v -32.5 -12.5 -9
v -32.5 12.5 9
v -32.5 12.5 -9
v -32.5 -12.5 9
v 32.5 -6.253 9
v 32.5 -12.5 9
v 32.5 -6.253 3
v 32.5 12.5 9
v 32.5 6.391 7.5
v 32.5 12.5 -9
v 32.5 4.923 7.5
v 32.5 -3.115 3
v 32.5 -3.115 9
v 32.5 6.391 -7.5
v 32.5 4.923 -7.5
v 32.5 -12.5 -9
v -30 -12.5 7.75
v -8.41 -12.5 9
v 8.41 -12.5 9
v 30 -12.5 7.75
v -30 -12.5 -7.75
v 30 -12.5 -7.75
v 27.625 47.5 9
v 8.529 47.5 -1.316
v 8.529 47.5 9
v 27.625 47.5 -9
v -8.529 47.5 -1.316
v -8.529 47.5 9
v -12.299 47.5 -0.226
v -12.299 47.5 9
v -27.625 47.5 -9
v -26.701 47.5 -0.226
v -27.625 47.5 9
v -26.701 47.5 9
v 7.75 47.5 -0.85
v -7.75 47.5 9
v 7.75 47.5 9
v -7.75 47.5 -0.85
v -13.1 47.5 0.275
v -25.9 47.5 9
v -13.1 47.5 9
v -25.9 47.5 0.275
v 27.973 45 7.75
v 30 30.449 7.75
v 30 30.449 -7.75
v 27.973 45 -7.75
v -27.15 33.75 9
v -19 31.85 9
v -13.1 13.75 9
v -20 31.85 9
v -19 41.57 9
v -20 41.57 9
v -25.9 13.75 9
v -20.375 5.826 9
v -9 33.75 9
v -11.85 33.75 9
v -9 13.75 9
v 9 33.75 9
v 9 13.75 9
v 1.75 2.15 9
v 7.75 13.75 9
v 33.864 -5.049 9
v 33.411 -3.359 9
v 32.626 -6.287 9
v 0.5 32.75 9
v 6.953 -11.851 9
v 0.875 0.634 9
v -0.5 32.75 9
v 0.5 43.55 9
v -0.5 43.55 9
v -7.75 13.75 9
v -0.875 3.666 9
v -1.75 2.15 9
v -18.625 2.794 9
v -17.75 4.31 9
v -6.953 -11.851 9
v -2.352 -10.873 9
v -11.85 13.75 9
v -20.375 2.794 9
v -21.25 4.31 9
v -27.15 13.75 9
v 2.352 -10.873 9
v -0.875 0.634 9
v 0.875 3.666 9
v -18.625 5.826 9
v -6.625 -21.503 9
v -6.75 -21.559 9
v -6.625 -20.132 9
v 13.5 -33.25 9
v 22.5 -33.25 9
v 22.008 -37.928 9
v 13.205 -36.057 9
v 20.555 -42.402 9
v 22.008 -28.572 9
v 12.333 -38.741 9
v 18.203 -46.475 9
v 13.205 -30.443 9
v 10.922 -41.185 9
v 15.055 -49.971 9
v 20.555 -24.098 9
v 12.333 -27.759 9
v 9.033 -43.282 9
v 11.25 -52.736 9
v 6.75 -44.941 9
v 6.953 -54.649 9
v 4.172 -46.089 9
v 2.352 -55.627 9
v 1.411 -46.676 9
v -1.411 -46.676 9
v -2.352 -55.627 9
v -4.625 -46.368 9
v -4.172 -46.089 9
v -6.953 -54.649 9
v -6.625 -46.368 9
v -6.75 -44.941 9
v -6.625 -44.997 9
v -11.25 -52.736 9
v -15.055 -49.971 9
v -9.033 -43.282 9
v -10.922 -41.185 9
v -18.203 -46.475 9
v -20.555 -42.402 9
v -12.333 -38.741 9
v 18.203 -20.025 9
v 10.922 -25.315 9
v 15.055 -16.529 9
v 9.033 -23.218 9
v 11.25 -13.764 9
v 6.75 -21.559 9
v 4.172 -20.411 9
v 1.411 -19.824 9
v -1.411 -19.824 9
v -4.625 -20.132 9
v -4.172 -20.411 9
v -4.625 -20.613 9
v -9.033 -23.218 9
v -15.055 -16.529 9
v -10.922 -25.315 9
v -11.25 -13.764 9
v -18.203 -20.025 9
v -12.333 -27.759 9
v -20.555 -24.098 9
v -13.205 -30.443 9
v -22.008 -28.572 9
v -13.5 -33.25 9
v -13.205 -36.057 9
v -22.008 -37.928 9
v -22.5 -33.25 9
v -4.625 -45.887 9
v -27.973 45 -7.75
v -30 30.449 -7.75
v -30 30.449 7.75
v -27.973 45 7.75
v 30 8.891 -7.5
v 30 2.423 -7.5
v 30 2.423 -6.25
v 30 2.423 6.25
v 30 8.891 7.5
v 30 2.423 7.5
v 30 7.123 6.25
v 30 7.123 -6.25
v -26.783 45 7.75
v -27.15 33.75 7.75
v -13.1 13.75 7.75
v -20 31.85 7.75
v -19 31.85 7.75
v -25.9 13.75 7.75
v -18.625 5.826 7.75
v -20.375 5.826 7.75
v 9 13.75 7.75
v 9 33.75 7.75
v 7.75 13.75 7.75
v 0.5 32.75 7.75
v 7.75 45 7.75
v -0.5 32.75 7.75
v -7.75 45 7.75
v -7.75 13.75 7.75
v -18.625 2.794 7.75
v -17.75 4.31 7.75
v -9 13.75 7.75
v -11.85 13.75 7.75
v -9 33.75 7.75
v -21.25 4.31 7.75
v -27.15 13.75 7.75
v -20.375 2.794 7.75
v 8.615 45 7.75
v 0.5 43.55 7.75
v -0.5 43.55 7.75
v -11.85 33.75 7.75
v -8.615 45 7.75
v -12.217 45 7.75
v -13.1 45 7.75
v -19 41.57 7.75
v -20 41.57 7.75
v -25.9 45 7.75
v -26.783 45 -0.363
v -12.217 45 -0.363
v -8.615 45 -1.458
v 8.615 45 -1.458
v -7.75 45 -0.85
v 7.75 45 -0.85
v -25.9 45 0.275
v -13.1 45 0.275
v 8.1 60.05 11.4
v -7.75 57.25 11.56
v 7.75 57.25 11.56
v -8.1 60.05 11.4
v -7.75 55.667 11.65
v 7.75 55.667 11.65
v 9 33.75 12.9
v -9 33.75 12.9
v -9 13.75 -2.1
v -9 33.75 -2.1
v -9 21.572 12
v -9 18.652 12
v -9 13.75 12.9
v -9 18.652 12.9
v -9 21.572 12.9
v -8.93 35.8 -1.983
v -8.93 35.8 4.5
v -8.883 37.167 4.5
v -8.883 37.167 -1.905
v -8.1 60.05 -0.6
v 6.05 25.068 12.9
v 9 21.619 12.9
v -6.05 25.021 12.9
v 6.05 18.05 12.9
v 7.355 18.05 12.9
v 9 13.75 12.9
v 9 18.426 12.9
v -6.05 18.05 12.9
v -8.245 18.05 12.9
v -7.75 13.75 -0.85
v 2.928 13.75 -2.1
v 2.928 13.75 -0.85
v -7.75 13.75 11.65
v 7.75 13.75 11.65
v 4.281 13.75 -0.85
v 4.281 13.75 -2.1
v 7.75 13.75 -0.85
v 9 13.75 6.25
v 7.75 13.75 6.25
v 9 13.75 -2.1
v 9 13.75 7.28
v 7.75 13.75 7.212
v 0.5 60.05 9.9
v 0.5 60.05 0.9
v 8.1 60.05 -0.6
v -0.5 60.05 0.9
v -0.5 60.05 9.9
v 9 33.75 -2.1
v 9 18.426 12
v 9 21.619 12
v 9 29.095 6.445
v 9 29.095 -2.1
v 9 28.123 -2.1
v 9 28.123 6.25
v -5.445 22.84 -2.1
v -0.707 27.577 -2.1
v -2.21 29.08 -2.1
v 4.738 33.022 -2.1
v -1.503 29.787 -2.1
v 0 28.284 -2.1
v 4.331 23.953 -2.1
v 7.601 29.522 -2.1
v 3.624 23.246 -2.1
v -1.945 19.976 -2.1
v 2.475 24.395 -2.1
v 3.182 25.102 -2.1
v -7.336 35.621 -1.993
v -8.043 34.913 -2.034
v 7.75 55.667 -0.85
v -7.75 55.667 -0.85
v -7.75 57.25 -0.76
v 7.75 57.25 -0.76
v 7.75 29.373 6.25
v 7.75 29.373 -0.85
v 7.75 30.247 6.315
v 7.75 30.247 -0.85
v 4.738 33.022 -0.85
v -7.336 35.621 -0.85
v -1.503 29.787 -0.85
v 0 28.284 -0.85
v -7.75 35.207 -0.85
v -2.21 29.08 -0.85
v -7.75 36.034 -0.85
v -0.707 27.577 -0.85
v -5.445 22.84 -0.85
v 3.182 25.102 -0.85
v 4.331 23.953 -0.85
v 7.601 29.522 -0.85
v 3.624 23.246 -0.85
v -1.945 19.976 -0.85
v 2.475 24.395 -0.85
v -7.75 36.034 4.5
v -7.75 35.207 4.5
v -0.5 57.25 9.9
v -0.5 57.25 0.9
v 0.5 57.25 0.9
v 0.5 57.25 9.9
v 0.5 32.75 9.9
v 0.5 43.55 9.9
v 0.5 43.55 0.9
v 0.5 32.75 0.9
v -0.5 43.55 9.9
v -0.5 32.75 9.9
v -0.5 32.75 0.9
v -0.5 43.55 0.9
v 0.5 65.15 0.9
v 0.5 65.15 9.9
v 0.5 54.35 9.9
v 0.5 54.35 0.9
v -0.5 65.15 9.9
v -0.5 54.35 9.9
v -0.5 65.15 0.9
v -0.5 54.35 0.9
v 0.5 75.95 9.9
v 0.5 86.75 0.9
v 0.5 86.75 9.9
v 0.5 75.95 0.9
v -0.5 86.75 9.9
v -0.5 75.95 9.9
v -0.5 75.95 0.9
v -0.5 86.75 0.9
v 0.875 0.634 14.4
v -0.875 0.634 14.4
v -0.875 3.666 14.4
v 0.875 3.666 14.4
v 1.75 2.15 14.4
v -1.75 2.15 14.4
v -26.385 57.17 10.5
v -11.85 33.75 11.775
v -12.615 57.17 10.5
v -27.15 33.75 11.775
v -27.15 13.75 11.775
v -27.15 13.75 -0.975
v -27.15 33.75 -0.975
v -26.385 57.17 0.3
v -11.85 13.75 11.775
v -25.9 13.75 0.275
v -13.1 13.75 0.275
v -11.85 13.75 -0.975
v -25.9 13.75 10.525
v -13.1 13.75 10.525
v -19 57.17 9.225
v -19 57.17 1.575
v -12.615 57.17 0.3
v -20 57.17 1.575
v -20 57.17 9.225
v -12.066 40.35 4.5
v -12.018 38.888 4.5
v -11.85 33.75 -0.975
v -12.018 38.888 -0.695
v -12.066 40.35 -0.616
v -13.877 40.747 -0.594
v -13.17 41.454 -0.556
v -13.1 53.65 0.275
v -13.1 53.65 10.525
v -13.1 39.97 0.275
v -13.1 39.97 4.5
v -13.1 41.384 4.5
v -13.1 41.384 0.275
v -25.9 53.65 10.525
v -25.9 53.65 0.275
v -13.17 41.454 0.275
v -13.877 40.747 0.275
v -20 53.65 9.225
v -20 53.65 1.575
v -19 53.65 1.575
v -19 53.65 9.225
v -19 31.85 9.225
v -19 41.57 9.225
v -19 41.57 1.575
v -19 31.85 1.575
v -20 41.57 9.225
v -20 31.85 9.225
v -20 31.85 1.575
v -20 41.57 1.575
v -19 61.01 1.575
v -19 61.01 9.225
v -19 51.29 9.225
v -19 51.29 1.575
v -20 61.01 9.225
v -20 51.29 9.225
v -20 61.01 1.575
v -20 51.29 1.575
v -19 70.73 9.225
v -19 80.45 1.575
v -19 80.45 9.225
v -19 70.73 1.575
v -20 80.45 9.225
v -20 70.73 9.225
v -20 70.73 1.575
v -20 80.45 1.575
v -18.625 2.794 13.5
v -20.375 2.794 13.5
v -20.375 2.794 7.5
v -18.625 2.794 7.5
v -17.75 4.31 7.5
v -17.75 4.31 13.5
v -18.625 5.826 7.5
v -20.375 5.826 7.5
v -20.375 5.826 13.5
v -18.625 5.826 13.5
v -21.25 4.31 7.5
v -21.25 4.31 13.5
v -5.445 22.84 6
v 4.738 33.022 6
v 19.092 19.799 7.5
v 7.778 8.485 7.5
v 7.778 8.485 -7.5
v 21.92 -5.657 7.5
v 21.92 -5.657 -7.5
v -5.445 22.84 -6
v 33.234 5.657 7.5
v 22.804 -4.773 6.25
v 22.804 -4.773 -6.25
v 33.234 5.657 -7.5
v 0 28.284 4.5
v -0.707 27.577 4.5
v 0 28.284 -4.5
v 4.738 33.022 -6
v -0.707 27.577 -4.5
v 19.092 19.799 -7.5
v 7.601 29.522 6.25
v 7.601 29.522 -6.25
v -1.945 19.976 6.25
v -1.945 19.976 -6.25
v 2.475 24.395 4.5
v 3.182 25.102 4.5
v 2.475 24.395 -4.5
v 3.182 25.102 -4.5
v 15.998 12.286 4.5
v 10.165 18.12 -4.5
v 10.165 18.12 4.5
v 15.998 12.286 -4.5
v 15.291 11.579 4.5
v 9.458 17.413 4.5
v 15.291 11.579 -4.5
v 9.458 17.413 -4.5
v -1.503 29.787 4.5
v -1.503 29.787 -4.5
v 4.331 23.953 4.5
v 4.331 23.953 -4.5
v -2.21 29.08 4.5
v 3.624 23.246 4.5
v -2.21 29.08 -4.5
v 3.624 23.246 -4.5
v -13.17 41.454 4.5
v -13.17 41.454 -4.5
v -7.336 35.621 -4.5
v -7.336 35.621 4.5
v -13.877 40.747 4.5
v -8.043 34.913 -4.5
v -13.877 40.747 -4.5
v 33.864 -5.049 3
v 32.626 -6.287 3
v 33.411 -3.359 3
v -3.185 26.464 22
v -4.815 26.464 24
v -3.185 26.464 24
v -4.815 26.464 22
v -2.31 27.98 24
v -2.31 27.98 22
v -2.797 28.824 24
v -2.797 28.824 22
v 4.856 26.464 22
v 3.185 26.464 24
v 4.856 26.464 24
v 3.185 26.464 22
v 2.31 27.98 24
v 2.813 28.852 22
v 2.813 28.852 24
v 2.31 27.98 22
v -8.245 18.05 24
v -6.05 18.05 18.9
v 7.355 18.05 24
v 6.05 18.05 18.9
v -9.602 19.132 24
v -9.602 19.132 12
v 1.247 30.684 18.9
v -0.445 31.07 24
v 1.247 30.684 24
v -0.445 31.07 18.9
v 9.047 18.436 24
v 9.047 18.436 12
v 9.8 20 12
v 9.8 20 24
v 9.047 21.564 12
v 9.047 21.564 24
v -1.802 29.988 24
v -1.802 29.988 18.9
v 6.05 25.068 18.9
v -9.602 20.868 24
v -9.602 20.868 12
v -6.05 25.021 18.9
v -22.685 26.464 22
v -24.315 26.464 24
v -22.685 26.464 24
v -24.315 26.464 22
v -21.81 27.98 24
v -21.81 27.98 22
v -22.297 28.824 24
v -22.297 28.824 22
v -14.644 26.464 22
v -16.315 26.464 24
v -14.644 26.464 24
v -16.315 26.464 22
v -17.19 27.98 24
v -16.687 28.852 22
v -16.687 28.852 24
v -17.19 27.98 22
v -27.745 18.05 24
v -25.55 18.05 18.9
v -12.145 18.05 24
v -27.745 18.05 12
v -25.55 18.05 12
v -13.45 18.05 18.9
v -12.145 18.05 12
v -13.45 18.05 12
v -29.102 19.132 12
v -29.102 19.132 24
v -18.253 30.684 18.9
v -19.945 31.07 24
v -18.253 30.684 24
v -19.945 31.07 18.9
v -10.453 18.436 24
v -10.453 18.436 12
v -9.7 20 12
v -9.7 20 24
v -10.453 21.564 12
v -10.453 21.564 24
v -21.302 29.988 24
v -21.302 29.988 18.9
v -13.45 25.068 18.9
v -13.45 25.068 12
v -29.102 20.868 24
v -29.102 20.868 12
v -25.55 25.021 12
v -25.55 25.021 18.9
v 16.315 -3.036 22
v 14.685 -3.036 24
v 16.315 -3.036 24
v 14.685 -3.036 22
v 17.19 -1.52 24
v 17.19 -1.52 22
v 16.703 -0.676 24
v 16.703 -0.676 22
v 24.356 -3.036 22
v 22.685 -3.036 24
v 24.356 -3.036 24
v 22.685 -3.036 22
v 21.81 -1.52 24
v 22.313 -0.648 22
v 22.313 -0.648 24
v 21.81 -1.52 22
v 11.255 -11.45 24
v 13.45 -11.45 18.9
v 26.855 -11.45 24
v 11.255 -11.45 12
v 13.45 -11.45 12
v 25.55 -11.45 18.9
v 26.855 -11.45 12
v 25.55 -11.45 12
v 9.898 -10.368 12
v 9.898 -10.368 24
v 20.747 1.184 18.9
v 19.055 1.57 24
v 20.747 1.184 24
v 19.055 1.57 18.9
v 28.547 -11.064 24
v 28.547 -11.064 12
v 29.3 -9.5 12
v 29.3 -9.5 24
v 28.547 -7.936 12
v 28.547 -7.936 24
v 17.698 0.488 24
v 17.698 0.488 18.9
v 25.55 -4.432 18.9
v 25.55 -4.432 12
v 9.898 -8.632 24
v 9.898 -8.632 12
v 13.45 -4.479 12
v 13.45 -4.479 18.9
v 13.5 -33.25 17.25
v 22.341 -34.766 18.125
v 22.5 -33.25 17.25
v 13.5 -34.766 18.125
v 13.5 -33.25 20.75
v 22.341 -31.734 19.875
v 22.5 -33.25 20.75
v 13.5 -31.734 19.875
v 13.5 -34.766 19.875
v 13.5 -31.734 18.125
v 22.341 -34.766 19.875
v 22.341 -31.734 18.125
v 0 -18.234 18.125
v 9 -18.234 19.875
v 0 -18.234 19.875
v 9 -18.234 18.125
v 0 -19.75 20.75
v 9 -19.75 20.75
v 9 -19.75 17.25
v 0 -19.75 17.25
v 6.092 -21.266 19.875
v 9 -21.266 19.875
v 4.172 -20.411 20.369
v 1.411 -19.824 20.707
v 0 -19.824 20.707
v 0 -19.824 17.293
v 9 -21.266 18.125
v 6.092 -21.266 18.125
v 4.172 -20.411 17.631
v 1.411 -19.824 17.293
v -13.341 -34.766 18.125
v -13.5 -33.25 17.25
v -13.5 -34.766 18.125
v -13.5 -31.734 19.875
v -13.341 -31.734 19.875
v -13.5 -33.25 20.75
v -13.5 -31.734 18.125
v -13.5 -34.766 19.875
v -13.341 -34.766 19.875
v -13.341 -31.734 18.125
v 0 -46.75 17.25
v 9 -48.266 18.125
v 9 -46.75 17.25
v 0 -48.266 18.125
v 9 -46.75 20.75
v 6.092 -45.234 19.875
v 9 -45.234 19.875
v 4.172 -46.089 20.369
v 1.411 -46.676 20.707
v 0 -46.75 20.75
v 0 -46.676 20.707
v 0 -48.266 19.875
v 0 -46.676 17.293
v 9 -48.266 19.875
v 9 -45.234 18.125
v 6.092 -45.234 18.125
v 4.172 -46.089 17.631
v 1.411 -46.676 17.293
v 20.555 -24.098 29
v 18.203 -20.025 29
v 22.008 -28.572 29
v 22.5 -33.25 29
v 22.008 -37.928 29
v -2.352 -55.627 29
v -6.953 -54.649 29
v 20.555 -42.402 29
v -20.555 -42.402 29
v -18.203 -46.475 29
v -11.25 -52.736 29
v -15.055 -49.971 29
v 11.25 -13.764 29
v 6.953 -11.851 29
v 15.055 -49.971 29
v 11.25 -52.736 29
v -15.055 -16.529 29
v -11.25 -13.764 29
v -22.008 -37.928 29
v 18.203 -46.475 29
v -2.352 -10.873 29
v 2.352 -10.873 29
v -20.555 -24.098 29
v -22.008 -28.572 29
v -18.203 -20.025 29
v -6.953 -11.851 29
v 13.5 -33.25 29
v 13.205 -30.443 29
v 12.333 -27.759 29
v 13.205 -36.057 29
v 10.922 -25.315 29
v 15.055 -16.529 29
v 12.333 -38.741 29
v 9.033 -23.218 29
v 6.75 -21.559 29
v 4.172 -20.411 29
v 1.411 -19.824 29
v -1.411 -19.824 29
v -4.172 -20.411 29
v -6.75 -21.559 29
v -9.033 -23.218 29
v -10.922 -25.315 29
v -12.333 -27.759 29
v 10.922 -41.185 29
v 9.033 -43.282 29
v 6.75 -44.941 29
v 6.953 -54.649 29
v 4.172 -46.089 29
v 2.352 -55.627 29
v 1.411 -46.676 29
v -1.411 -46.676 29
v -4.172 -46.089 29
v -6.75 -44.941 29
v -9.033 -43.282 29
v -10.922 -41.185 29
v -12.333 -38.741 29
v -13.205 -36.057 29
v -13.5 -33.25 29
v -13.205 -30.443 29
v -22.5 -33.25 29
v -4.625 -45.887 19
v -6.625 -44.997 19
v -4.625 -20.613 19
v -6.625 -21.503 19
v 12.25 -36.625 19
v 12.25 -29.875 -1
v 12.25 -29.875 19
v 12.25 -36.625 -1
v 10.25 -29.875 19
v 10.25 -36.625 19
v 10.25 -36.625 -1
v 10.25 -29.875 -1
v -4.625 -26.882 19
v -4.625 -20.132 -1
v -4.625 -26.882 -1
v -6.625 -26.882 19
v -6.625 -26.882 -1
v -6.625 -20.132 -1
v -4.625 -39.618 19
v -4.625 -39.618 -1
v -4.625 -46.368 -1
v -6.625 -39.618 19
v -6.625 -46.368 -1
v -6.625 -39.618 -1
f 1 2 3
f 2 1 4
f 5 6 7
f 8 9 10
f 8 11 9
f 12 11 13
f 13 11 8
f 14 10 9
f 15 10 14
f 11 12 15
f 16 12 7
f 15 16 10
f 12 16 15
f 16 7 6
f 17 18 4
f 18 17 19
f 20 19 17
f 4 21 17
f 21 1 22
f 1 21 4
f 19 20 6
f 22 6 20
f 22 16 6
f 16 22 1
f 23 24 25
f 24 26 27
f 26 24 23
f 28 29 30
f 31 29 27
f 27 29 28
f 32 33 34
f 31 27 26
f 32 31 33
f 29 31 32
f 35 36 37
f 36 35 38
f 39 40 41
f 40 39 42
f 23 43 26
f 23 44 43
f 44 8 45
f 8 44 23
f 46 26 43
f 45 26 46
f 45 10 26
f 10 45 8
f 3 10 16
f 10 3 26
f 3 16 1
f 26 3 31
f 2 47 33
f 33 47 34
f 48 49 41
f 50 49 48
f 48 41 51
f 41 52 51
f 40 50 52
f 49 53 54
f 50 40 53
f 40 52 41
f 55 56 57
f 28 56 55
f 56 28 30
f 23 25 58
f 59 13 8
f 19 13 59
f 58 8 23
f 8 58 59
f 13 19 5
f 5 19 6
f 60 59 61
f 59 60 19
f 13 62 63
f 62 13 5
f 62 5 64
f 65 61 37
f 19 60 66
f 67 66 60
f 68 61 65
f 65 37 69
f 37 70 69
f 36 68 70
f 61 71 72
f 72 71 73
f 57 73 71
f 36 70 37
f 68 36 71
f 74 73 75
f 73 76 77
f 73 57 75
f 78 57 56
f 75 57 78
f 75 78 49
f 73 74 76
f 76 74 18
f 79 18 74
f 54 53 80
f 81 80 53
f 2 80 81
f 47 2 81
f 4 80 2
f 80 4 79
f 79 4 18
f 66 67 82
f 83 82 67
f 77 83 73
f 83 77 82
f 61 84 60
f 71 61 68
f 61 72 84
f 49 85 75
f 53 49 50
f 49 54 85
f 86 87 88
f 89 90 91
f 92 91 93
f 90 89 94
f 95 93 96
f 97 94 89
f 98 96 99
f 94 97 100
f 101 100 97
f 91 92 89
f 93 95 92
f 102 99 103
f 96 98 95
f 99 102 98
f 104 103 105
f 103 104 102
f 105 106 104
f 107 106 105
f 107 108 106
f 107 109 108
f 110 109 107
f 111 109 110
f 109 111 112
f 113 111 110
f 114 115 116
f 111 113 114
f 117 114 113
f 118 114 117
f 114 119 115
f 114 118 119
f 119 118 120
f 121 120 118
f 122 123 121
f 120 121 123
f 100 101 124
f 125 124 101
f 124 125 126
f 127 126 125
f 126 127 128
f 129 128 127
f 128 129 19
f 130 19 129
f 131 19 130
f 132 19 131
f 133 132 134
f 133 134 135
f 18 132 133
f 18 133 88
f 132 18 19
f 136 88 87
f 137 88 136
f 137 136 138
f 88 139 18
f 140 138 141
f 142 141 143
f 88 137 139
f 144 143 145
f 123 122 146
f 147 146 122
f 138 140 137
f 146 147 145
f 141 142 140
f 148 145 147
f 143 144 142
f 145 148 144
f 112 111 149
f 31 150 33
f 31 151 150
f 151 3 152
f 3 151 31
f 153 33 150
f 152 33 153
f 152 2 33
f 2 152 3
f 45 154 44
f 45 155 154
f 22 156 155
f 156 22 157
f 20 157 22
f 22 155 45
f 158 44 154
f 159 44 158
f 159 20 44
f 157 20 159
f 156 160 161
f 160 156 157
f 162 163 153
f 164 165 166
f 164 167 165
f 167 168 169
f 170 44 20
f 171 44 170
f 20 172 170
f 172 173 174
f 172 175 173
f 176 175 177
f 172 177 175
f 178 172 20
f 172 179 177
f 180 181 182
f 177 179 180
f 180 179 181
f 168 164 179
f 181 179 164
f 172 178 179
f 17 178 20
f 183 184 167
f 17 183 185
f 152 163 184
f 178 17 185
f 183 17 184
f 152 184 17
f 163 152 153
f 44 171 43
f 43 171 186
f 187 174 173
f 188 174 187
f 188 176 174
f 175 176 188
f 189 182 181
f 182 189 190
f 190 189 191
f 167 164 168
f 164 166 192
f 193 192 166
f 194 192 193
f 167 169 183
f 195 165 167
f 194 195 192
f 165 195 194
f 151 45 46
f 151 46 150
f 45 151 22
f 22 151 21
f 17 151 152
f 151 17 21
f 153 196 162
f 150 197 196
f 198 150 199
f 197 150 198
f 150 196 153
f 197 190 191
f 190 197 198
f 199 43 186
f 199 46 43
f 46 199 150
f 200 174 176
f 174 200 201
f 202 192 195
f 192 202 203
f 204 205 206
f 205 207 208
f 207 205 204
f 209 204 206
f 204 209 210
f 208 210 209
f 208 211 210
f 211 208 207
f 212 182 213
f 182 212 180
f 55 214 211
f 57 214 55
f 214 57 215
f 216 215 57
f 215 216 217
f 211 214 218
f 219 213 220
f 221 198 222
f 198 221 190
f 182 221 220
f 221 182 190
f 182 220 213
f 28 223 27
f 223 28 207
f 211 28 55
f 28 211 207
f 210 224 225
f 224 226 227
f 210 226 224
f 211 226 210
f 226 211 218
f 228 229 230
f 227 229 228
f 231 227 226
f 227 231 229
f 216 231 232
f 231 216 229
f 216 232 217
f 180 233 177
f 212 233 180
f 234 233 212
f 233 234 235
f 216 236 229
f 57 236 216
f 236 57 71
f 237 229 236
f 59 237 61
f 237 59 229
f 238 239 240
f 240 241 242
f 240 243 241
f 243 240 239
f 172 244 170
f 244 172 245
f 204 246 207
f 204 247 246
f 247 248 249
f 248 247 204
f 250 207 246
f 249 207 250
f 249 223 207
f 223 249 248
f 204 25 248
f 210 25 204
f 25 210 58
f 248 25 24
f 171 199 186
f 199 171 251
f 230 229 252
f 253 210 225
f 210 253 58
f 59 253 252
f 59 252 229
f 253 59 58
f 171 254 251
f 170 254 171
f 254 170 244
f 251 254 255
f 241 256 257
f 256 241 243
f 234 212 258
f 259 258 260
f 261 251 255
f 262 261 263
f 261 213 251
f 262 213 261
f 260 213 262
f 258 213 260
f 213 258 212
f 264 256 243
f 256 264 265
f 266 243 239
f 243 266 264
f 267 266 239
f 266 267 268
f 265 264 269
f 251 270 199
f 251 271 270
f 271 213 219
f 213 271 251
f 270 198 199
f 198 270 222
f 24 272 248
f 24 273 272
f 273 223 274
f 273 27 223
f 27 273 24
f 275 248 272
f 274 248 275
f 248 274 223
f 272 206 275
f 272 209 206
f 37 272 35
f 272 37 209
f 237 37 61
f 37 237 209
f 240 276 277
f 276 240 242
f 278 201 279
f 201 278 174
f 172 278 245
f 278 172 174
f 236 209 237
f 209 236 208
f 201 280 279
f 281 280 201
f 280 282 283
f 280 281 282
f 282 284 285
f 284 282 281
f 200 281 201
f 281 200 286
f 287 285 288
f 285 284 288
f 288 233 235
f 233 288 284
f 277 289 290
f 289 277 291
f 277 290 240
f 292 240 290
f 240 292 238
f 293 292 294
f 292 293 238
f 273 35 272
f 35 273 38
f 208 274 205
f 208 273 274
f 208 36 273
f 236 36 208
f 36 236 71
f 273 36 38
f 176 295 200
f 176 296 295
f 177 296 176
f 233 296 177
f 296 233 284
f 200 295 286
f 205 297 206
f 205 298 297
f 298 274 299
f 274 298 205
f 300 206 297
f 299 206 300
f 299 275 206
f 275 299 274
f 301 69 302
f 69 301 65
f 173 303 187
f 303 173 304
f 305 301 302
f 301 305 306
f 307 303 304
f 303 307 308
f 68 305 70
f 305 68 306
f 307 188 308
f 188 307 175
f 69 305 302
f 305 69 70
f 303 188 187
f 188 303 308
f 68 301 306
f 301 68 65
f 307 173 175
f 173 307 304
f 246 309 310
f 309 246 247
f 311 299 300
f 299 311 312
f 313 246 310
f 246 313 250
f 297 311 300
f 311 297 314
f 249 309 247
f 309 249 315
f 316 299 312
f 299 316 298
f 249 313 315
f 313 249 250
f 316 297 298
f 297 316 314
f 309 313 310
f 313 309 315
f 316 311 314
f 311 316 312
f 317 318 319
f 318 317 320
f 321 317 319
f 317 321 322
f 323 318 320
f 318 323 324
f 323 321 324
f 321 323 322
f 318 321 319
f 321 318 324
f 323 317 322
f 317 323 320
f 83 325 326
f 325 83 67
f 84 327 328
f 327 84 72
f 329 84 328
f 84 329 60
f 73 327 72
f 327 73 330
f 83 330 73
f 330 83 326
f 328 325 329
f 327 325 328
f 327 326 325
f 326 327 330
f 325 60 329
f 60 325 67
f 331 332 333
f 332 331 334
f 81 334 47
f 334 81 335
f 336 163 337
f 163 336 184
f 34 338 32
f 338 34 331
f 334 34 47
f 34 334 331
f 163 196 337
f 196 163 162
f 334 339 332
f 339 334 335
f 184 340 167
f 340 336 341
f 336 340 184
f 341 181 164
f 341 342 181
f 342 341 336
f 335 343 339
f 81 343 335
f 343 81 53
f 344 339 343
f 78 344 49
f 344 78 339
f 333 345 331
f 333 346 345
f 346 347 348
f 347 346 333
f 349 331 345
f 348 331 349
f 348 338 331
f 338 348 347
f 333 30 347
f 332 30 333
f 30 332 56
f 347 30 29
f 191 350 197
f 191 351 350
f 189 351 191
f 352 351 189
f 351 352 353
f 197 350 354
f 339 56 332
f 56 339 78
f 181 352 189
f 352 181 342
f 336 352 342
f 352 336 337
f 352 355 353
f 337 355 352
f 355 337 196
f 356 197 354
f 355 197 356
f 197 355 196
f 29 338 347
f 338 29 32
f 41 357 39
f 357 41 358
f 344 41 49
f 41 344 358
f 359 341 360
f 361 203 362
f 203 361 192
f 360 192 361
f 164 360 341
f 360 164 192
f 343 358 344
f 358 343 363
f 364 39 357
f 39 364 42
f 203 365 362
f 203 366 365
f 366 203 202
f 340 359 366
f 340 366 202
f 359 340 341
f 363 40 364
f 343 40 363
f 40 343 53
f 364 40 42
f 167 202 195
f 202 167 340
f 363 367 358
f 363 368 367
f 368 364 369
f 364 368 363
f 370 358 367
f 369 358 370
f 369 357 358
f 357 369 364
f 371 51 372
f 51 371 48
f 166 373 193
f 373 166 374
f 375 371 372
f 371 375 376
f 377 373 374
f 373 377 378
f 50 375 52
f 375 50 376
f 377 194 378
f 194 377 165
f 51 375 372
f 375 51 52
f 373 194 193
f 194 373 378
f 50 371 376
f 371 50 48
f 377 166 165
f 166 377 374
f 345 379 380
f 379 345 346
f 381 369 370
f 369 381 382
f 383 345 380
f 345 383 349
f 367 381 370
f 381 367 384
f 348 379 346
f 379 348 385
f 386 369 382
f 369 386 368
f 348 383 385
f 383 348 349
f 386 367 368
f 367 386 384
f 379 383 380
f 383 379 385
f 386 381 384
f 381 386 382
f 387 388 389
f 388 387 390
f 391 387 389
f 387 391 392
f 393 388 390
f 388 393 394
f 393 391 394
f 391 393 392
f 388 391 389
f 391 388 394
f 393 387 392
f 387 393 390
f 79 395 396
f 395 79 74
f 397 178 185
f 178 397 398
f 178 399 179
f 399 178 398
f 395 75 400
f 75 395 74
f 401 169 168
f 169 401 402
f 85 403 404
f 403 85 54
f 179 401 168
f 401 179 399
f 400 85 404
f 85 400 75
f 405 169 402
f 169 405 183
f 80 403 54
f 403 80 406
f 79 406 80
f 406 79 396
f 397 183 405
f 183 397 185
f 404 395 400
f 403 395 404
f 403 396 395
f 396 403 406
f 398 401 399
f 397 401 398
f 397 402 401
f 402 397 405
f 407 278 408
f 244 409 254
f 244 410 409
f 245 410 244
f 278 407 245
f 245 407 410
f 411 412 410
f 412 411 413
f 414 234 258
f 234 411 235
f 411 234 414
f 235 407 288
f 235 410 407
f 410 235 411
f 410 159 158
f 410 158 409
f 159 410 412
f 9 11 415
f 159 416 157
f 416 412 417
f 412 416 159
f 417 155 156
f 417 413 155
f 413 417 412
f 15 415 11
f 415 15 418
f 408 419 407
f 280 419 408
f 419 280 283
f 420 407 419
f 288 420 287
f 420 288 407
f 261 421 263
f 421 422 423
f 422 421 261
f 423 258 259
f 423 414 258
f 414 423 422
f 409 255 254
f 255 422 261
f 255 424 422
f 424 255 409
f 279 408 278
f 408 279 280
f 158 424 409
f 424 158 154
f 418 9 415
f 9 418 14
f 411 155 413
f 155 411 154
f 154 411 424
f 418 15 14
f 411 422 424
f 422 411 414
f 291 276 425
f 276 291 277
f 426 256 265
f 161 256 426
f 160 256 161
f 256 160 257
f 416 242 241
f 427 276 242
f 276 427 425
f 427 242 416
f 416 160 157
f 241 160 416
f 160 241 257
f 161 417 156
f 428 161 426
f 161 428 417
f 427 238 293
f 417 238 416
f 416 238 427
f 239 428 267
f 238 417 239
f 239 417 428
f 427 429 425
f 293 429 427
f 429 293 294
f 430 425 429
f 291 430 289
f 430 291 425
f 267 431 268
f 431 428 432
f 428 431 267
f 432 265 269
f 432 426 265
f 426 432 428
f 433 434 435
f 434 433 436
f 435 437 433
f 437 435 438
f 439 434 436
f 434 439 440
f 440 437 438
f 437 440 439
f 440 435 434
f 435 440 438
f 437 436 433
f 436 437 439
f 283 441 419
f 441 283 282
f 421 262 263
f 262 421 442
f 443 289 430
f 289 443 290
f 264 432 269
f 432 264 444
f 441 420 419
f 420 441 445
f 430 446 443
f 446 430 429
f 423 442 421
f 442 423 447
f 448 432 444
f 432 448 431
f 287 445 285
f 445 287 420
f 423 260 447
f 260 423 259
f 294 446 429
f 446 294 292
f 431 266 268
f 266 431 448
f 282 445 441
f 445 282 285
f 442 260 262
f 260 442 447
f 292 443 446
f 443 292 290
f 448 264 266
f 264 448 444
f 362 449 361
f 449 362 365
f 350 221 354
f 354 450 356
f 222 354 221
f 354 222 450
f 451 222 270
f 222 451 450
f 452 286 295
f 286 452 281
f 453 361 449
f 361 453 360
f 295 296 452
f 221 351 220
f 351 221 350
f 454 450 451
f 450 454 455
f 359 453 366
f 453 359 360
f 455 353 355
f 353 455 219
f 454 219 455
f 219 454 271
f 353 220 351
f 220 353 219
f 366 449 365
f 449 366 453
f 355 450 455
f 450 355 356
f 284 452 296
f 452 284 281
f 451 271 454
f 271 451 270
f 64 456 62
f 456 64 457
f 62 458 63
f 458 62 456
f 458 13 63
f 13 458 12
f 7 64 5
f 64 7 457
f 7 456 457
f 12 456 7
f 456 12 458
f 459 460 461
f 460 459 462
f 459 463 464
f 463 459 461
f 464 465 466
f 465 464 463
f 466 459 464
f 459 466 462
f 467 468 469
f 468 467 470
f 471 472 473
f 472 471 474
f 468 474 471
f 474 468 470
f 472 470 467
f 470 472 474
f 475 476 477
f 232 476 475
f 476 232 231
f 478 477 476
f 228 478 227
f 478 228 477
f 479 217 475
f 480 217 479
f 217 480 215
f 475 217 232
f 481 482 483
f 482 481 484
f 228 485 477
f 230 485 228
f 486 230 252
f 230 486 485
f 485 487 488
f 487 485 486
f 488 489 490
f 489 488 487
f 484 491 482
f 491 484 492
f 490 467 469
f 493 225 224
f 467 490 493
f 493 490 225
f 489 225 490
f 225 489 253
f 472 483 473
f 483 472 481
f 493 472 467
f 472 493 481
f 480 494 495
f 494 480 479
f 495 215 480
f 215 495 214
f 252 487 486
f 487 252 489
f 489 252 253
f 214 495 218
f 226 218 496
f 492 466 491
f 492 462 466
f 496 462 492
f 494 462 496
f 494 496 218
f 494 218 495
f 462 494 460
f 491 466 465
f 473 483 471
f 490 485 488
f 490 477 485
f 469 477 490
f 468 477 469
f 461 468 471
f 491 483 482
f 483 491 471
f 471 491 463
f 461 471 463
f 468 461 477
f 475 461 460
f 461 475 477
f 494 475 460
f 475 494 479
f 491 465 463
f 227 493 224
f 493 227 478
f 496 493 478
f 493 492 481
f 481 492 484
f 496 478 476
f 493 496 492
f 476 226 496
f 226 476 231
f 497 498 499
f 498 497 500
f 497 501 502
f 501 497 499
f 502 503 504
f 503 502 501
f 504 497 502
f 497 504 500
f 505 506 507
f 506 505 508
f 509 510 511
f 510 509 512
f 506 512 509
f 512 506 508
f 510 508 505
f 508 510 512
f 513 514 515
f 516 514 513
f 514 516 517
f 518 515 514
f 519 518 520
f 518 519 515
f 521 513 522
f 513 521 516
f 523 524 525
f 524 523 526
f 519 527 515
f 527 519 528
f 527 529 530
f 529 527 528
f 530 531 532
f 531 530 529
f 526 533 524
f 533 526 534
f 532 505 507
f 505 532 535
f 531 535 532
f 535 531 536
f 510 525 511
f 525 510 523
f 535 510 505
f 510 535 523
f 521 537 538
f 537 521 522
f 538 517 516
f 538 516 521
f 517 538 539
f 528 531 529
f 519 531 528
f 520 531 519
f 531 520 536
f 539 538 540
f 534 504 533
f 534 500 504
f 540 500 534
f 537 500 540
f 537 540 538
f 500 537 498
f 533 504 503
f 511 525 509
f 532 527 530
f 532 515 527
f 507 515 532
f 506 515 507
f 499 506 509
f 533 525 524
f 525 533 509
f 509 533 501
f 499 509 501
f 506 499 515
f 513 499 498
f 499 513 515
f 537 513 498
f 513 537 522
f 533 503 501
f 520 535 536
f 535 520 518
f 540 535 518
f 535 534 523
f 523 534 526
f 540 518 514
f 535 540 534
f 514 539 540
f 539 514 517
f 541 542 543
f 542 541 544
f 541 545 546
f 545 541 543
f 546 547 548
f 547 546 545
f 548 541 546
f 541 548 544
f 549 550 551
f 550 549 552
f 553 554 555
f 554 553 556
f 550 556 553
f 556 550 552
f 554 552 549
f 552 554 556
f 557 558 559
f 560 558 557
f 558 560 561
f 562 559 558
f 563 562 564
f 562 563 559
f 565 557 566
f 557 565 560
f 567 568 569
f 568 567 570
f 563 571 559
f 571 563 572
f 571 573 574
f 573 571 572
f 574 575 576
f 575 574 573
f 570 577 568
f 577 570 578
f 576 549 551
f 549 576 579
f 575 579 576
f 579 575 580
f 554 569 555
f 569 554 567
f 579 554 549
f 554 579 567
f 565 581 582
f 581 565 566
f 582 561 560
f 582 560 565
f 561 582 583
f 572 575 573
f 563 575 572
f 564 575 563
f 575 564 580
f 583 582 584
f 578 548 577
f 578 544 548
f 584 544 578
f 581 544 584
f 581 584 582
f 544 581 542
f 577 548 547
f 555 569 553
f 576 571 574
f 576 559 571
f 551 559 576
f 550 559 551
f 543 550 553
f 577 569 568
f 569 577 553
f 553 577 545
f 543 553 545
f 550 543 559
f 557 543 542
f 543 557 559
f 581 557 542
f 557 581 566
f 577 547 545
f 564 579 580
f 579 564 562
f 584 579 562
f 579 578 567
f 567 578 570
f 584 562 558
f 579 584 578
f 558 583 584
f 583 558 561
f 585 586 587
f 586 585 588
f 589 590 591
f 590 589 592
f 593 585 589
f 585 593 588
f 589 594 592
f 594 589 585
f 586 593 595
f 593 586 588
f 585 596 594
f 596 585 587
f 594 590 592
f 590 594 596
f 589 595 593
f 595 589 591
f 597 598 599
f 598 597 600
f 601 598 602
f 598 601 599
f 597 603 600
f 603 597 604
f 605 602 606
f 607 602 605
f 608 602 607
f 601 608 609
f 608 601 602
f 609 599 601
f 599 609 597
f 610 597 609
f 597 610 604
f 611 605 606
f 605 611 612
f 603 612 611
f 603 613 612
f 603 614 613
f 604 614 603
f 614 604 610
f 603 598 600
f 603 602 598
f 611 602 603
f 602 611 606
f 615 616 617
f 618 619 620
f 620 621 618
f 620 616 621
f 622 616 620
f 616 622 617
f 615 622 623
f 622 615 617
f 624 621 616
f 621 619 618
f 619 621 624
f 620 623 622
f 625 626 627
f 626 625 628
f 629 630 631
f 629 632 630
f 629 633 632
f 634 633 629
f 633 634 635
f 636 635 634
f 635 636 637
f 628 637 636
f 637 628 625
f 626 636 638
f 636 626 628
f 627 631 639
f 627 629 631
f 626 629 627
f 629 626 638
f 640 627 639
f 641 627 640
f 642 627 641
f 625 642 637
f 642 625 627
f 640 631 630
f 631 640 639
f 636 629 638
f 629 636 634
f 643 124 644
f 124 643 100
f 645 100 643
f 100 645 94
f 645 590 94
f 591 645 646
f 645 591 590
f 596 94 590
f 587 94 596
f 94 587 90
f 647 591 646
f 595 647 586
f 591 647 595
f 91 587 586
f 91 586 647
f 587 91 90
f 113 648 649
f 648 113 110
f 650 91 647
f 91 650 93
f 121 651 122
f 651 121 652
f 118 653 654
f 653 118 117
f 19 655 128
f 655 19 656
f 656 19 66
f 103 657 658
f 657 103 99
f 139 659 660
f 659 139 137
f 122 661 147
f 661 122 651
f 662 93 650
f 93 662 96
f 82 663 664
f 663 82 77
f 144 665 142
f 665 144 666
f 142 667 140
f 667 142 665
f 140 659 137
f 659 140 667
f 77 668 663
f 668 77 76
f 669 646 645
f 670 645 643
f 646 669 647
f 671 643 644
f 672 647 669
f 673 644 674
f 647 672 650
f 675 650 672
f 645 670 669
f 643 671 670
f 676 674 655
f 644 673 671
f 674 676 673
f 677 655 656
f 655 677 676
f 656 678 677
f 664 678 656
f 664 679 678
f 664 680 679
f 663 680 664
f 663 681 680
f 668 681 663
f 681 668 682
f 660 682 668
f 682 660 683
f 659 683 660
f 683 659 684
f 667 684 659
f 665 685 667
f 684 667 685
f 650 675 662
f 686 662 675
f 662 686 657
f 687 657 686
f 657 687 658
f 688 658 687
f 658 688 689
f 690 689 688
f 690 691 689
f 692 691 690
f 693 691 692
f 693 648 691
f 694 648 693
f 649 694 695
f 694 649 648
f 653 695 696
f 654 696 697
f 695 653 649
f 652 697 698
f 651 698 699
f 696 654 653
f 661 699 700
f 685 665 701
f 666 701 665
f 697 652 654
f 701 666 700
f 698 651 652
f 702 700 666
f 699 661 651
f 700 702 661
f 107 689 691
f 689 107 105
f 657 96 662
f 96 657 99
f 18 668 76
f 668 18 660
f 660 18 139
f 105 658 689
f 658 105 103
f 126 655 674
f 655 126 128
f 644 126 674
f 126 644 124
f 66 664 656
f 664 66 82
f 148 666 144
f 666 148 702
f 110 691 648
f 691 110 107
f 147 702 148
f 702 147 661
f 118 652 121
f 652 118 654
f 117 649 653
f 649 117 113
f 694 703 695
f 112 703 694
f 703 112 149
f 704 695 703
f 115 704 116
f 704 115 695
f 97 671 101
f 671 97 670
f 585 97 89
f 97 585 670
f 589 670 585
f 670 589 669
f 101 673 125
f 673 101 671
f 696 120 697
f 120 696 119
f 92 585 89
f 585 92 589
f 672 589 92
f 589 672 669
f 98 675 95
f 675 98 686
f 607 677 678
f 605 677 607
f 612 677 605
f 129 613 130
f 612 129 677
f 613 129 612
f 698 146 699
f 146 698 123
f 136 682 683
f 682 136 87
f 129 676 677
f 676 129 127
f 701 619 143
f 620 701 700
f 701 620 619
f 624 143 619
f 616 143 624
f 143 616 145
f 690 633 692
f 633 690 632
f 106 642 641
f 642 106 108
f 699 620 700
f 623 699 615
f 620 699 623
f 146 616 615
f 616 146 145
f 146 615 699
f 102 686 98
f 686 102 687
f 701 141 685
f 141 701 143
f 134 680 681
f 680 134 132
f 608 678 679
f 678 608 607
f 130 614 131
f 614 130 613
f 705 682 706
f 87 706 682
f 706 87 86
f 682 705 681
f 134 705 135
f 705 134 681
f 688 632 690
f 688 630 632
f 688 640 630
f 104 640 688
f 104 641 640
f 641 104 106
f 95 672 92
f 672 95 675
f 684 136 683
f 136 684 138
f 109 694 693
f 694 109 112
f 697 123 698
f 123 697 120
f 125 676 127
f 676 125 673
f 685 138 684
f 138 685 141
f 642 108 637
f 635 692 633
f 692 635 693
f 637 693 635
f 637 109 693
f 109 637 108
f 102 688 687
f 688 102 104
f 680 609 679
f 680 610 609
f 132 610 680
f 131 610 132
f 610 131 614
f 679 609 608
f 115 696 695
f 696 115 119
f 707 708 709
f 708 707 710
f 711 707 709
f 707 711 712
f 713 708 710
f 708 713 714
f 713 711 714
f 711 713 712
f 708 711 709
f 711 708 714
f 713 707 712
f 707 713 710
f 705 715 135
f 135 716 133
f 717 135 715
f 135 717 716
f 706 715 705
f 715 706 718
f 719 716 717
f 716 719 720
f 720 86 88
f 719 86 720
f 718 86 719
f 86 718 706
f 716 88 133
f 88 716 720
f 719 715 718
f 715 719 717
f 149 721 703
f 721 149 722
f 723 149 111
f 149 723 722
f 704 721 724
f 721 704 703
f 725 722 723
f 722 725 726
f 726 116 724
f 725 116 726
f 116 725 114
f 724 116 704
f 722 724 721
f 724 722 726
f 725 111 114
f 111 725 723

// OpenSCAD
// Goblin Hand Base Structure - Mechanical Framework
// Parametric palm frame with servo mounting points
// Supports 8-12 servo motors for coupled finger/wrist control
// Weight optimized with hollow interior

// ==============================================================================
// DIMENSIONAL PARAMETERS (mm)
// ==============================================================================

// Palm dimensions (actual goblin proportions)
PALM_LENGTH = 95.0;          // Palm depth (wrist to fingertip center)
PALM_WIDTH = 65.0;           // Palm width (thumb to pinky edge)
PALM_THICKNESS = 18.0;       // Palm main body thickness

// Finger dimensions (coupled groups)
FINGER_LENGTH = 72.0;        // Proximal + middle finger length
FINGER_WIDTH = 18.0;         // Single finger width
FINGER_HEIGHT = 15.0;        // Finger height (extrusion)

// Thumb specifications
THUMB_LENGTH = 55.0;         // Thumb length (shorter, opposable)
THUMB_WIDTH = 16.0;
THUMB_ANGLE = 45.0;          // Angle from palm

// Servo mounting points
SERVO_MOUNTING_HEIGHT = 12.0; // Height of servo motor centerline above palm
SERVO_HOLE_D = 3.5;          // M3 mounting hole diameter
SERVO_HOLE_SPACING = 32.0;   // Standard servo mounting spacing

// Wrist interface
WRIST_DIAMETER = 45.0;       // Connection to arm
WRIST_DEPTH = 20.0;          // Wrist stub into hand
WRIST_SERVO_HEIGHT = 15.0;   // Height of wrist servo axis

// Material properties
PLA_DENSITY = 1.25;          // g/cm³ for weight calculation
WALL_THICKNESS = 2.5;        // Minimum wall thickness
INFILL_FACTOR = 0.20;        // 20% infill for hollow parts

// ==============================================================================
// PALM BASE MODULE
// ==============================================================================

module palm_base(width, length, thickness) {
    difference() {
        // Outer shape: tapered palm with rounded edges
        hull() {
            // Wrist end (wider)
            translate([0, 0, 0])
                cube([width, 25, thickness], center=true);
            
            // Finger ends (narrower, rounded)
            translate([0, length*0.5 - 10, 0])
                scale([0.85, 1.0, 1.0])
                    cube([width, 20, thickness], center=true);
        }
        
        // Hollow interior (reduces weight, prevents warping)
        translate([0, 0, 0])
            cube([width - WALL_THICKNESS*2, length - WALL_THICKNESS*2, thickness - WALL_THICKNESS], center=true);
        
        // Bottom drainage holes (prevent water pooling in confined spaces)
        for(x = [-15, 0, 15]) {
            for(y = [-10, 10, 30]) {
                translate([x, y, -thickness*0.4])
                    cylinder(h=thickness*0.3, d=4);
            }
        }
    }
}

// ==============================================================================
// FINGER STRUCTURES (Coupled Groups for Control)
// ==============================================================================

module finger_group(name, position, length, width, height, linkage_type) {
    // Linkage types:
    // "coupled" = all digits move together (index+middle+ring via single servo)
    // "pinky" = pinky group (separate servo)
    // "thumb" = opposition servo
    
    translate(position) {
        // Main finger structure (hollow, ribbed)
        difference() {
            // Outer shape: tapered finger
            hull() {
                translate([0, 0, 0])
                    cube([width, 20, height], center=true);
                translate([0, length*0.4, 0])
                    scale([0.9, 1.0, 0.8])
                        cube([width, 15, height], center=true);
            }
            
            // Hollow interior
            translate([0, 0, 0])
                cube([width - WALL_THICKNESS, length - WALL_THICKNESS*2, height - WALL_THICKNESS], center=true);
        }
        
        // Reinforcement ribs inside (for stiffness without weight)
        for(i = [0:2]) {
            translate([0, (length*0.2) + i*(length*0.3), 0])
                cube([1.0, length*0.15, height*0.6], center=true);
        }
        
        // Servo linkage attachment point
        translate([0, -length*0.3, height*0.4])
            cylinder(h=6, d=SERVO_HOLE_D, center=true);
    }
}

// ==============================================================================
// SERVO MOUNTING BRACKET
// ==============================================================================

module servo_mounting_bracket(servo_type) {
    // servo_type: "sg90" (standard hobby servo 22.8×11.6×10.2mm)
    //             "micro" (micro servo 16×8×8mm)
    
    servo_length = (servo_type == "sg90") ? 22.8 : 16.0;
    servo_width = (servo_type == "sg90") ? 11.6 : 8.0;
    servo_height = (servo_type == "sg90") ? 10.2 : 8.0;
    
    difference() {
        // Main bracket body
        hull() {
            translate([-servo_width*0.5 - 2, 0, 0])
                cylinder(h=SERVO_MOUNTING_HEIGHT, d=4);
            translate([servo_width*0.5 + 2, 0, 0])
                cylinder(h=SERVO_MOUNTING_HEIGHT, d=4);
            translate([0, servo_length*0.4, 0])
                cylinder(h=SERVO_MOUNTING_HEIGHT, d=4);
        }
        
        // Servo motor cavity
        translate([0, 0, SERVO_MOUNTING_HEIGHT - servo_height - 0.5])
            cube([servo_width + 0.5, servo_length + 0.5, servo_height + 1], center=true);
        
        // M3 mounting holes for servo flange
        for(y = [-servo_length*0.35, servo_length*0.35]) {
            translate([-servo_width*0.35, y, SERVO_MOUNTING_HEIGHT - 2])
                cylinder(h=4, d=SERVO_HOLE_D);
            translate([servo_width*0.35, y, SERVO_MOUNTING_HEIGHT - 2])
                cylinder(h=4, d=SERVO_HOLE_D);
        }
        
        // Cable routing channel
        translate([0, -servo_length*0.5, SERVO_MOUNTING_HEIGHT*0.5])
            cube([4, servo_length*0.3, SERVO_MOUNTING_HEIGHT*0.4], center=true);
    }
}

// ==============================================================================
// WRIST INTERFACE CONNECTOR
// ==============================================================================

module wrist_connector(diameter, depth, servo_height) {
    difference() {
        // Main connector body (cylinder)
        cylinder(h=depth, d=diameter);
        
        // Internal passage for cables from arm ESP32
        translate([0, 0, -1])
            cylinder(h=depth+2, d=diameter*0.6);
        
        // M3 mounting holes (attach hand to arm)
        for(angle = [0, 90, 180, 270]) {
            translate([cos(angle)*diameter*0.3, sin(angle)*diameter*0.3, depth*0.5])
                rotate([0, 90, 0])
                    cylinder(h=diameter*0.2, d=SERVO_HOLE_D);
        }
        
        // Servo axis cavity (for wrist rotation servo)
        translate([0, 0, depth - servo_height - 1])
            cylinder(h=servo_height + 1, d=8.0); // 8mm servo horn clearance
    }
    
    // Reinforcing ribs
    for(angle = [0, 120, 240]) {
        translate([cos(angle)*diameter*0.25, sin(angle)*diameter*0.25, 0])
            cube([2, diameter*0.15, depth], center=true);
    }
}

// ==============================================================================
// COMPLETE HAND ASSEMBLY (LEFT or RIGHT)
// ==============================================================================

module goblin_hand_assembly(hand_side) {
    // hand_side: "left" or "right" (affects mirror/orientation)
    
    mirror_x = (hand_side == "right") ? [-1, 0, 0] : [1, 0, 0];
    
    // Palm base structure
    palm_base(PALM_WIDTH, PALM_LENGTH, PALM_THICKNESS);
    
    // Finger groups (3 groups for coupled control = 3 servos needed)
    
    // Group 1: Index + Middle + Ring fingers (coupled curl via servo #1)
    finger_group(
        "imr_group",
        [0, PALM_LENGTH*0.25, PALM_THICKNESS*0.3],
        FINGER_LENGTH,
        FINGER_WIDTH,
        FINGER_HEIGHT,
        "coupled"
    );
    
    // Group 2: Pinky finger (separate servo #2)
    finger_group(
        "pinky",
        [-PALM_WIDTH*0.3, PALM_LENGTH*0.25, PALM_THICKNESS*0.3],
        FINGER_LENGTH * 0.9,
        FINGER_WIDTH * 0.85,
        FINGER_HEIGHT * 0.85,
        "pinky"
    );
    
    // Thumb (opposing servo #3)
    rotate([0, 0, THUMB_ANGLE])
        translate([PALM_WIDTH*0.3, -PALM_LENGTH*0.1, 0])
            finger_group(
                "thumb",
                [0, 0, 0],
                THUMB_LENGTH,
                THUMB_WIDTH,
                FINGER_HEIGHT,
                "thumb"
            );
    
    // Servo mounting brackets (3 primary servo motors)
    
    // Servo #1: Main finger curl (coupled IMR group) - positioned at palm center
    translate([0, 20, SERVO_MOUNTING_HEIGHT])
        servo_mounting_bracket("sg90");
    
    // Servo #2: Pinky group - positioned at pinky location
    translate([-PALM_WIDTH*0.3, 20, SERVO_MOUNTING_HEIGHT])
        servo_mounting_bracket("sg90");
    
    // Servo #3: Thumb opposition - positioned at thumb base
    translate([PALM_WIDTH*0.3, -PALM_LENGTH*0.1, SERVO_MOUNTING_HEIGHT])
        servo_mounting_bracket("sg90");
    
    // Wrist interface connector
    translate([0, -PALM_LENGTH*0.35, PALM_THICKNESS*0.5])
        wrist_connector(WRIST_DIAMETER, WRIST_DEPTH, WRIST_SERVO_HEIGHT);
}

// ==============================================================================
// WEIGHT CALCULATION
// ==============================================================================

function estimate_hand_weight(servo_count=3) =
    let(
        // 3D printed components (PLA, 20% infill)
        palm_volume = (PALM_LENGTH * PALM_WIDTH * PALM_THICKNESS) * INFILL_FACTOR,
        fingers_volume = (FINGER_LENGTH * FINGER_WIDTH * FINGER_HEIGHT * 3) * INFILL_FACTOR,
        thumb_volume = (THUMB_LENGTH * THUMB_WIDTH * FINGER_HEIGHT) * INFILL_FACTOR,
        wrist_volume = (3.14159 * (WRIST_DIAMETER*0.5)*(WRIST_DIAMETER*0.5) * WRIST_DEPTH) * INFILL_FACTOR,
        
        total_pla_volume = palm_volume + fingers_volume + thumb_volume + wrist_volume,
        pla_mass = total_pla_volume * PLA_DENSITY,
        
        // Hardware and electronics
        servo_mass = servo_count * 9.0,     // ~9g per SG90 servo
        brackets_mass = servo_count * 3.0,  // ~3g per bracket
        hardware_mass = 8.0,                // Screws, inserts, connectors
        
        total_mass = pla_mass + servo_mass + brackets_mass + hardware_mass
    )
    total_mass;

// ==============================================================================
// ASSEMBLY RENDERING
// ==============================================================================

// Render complete left goblin hand with 3 servos
goblin_hand_assembly("left");

// Display weight estimate
echo(str("Goblin Hand Weight: ", estimate_hand_weight(3), " grams"));
